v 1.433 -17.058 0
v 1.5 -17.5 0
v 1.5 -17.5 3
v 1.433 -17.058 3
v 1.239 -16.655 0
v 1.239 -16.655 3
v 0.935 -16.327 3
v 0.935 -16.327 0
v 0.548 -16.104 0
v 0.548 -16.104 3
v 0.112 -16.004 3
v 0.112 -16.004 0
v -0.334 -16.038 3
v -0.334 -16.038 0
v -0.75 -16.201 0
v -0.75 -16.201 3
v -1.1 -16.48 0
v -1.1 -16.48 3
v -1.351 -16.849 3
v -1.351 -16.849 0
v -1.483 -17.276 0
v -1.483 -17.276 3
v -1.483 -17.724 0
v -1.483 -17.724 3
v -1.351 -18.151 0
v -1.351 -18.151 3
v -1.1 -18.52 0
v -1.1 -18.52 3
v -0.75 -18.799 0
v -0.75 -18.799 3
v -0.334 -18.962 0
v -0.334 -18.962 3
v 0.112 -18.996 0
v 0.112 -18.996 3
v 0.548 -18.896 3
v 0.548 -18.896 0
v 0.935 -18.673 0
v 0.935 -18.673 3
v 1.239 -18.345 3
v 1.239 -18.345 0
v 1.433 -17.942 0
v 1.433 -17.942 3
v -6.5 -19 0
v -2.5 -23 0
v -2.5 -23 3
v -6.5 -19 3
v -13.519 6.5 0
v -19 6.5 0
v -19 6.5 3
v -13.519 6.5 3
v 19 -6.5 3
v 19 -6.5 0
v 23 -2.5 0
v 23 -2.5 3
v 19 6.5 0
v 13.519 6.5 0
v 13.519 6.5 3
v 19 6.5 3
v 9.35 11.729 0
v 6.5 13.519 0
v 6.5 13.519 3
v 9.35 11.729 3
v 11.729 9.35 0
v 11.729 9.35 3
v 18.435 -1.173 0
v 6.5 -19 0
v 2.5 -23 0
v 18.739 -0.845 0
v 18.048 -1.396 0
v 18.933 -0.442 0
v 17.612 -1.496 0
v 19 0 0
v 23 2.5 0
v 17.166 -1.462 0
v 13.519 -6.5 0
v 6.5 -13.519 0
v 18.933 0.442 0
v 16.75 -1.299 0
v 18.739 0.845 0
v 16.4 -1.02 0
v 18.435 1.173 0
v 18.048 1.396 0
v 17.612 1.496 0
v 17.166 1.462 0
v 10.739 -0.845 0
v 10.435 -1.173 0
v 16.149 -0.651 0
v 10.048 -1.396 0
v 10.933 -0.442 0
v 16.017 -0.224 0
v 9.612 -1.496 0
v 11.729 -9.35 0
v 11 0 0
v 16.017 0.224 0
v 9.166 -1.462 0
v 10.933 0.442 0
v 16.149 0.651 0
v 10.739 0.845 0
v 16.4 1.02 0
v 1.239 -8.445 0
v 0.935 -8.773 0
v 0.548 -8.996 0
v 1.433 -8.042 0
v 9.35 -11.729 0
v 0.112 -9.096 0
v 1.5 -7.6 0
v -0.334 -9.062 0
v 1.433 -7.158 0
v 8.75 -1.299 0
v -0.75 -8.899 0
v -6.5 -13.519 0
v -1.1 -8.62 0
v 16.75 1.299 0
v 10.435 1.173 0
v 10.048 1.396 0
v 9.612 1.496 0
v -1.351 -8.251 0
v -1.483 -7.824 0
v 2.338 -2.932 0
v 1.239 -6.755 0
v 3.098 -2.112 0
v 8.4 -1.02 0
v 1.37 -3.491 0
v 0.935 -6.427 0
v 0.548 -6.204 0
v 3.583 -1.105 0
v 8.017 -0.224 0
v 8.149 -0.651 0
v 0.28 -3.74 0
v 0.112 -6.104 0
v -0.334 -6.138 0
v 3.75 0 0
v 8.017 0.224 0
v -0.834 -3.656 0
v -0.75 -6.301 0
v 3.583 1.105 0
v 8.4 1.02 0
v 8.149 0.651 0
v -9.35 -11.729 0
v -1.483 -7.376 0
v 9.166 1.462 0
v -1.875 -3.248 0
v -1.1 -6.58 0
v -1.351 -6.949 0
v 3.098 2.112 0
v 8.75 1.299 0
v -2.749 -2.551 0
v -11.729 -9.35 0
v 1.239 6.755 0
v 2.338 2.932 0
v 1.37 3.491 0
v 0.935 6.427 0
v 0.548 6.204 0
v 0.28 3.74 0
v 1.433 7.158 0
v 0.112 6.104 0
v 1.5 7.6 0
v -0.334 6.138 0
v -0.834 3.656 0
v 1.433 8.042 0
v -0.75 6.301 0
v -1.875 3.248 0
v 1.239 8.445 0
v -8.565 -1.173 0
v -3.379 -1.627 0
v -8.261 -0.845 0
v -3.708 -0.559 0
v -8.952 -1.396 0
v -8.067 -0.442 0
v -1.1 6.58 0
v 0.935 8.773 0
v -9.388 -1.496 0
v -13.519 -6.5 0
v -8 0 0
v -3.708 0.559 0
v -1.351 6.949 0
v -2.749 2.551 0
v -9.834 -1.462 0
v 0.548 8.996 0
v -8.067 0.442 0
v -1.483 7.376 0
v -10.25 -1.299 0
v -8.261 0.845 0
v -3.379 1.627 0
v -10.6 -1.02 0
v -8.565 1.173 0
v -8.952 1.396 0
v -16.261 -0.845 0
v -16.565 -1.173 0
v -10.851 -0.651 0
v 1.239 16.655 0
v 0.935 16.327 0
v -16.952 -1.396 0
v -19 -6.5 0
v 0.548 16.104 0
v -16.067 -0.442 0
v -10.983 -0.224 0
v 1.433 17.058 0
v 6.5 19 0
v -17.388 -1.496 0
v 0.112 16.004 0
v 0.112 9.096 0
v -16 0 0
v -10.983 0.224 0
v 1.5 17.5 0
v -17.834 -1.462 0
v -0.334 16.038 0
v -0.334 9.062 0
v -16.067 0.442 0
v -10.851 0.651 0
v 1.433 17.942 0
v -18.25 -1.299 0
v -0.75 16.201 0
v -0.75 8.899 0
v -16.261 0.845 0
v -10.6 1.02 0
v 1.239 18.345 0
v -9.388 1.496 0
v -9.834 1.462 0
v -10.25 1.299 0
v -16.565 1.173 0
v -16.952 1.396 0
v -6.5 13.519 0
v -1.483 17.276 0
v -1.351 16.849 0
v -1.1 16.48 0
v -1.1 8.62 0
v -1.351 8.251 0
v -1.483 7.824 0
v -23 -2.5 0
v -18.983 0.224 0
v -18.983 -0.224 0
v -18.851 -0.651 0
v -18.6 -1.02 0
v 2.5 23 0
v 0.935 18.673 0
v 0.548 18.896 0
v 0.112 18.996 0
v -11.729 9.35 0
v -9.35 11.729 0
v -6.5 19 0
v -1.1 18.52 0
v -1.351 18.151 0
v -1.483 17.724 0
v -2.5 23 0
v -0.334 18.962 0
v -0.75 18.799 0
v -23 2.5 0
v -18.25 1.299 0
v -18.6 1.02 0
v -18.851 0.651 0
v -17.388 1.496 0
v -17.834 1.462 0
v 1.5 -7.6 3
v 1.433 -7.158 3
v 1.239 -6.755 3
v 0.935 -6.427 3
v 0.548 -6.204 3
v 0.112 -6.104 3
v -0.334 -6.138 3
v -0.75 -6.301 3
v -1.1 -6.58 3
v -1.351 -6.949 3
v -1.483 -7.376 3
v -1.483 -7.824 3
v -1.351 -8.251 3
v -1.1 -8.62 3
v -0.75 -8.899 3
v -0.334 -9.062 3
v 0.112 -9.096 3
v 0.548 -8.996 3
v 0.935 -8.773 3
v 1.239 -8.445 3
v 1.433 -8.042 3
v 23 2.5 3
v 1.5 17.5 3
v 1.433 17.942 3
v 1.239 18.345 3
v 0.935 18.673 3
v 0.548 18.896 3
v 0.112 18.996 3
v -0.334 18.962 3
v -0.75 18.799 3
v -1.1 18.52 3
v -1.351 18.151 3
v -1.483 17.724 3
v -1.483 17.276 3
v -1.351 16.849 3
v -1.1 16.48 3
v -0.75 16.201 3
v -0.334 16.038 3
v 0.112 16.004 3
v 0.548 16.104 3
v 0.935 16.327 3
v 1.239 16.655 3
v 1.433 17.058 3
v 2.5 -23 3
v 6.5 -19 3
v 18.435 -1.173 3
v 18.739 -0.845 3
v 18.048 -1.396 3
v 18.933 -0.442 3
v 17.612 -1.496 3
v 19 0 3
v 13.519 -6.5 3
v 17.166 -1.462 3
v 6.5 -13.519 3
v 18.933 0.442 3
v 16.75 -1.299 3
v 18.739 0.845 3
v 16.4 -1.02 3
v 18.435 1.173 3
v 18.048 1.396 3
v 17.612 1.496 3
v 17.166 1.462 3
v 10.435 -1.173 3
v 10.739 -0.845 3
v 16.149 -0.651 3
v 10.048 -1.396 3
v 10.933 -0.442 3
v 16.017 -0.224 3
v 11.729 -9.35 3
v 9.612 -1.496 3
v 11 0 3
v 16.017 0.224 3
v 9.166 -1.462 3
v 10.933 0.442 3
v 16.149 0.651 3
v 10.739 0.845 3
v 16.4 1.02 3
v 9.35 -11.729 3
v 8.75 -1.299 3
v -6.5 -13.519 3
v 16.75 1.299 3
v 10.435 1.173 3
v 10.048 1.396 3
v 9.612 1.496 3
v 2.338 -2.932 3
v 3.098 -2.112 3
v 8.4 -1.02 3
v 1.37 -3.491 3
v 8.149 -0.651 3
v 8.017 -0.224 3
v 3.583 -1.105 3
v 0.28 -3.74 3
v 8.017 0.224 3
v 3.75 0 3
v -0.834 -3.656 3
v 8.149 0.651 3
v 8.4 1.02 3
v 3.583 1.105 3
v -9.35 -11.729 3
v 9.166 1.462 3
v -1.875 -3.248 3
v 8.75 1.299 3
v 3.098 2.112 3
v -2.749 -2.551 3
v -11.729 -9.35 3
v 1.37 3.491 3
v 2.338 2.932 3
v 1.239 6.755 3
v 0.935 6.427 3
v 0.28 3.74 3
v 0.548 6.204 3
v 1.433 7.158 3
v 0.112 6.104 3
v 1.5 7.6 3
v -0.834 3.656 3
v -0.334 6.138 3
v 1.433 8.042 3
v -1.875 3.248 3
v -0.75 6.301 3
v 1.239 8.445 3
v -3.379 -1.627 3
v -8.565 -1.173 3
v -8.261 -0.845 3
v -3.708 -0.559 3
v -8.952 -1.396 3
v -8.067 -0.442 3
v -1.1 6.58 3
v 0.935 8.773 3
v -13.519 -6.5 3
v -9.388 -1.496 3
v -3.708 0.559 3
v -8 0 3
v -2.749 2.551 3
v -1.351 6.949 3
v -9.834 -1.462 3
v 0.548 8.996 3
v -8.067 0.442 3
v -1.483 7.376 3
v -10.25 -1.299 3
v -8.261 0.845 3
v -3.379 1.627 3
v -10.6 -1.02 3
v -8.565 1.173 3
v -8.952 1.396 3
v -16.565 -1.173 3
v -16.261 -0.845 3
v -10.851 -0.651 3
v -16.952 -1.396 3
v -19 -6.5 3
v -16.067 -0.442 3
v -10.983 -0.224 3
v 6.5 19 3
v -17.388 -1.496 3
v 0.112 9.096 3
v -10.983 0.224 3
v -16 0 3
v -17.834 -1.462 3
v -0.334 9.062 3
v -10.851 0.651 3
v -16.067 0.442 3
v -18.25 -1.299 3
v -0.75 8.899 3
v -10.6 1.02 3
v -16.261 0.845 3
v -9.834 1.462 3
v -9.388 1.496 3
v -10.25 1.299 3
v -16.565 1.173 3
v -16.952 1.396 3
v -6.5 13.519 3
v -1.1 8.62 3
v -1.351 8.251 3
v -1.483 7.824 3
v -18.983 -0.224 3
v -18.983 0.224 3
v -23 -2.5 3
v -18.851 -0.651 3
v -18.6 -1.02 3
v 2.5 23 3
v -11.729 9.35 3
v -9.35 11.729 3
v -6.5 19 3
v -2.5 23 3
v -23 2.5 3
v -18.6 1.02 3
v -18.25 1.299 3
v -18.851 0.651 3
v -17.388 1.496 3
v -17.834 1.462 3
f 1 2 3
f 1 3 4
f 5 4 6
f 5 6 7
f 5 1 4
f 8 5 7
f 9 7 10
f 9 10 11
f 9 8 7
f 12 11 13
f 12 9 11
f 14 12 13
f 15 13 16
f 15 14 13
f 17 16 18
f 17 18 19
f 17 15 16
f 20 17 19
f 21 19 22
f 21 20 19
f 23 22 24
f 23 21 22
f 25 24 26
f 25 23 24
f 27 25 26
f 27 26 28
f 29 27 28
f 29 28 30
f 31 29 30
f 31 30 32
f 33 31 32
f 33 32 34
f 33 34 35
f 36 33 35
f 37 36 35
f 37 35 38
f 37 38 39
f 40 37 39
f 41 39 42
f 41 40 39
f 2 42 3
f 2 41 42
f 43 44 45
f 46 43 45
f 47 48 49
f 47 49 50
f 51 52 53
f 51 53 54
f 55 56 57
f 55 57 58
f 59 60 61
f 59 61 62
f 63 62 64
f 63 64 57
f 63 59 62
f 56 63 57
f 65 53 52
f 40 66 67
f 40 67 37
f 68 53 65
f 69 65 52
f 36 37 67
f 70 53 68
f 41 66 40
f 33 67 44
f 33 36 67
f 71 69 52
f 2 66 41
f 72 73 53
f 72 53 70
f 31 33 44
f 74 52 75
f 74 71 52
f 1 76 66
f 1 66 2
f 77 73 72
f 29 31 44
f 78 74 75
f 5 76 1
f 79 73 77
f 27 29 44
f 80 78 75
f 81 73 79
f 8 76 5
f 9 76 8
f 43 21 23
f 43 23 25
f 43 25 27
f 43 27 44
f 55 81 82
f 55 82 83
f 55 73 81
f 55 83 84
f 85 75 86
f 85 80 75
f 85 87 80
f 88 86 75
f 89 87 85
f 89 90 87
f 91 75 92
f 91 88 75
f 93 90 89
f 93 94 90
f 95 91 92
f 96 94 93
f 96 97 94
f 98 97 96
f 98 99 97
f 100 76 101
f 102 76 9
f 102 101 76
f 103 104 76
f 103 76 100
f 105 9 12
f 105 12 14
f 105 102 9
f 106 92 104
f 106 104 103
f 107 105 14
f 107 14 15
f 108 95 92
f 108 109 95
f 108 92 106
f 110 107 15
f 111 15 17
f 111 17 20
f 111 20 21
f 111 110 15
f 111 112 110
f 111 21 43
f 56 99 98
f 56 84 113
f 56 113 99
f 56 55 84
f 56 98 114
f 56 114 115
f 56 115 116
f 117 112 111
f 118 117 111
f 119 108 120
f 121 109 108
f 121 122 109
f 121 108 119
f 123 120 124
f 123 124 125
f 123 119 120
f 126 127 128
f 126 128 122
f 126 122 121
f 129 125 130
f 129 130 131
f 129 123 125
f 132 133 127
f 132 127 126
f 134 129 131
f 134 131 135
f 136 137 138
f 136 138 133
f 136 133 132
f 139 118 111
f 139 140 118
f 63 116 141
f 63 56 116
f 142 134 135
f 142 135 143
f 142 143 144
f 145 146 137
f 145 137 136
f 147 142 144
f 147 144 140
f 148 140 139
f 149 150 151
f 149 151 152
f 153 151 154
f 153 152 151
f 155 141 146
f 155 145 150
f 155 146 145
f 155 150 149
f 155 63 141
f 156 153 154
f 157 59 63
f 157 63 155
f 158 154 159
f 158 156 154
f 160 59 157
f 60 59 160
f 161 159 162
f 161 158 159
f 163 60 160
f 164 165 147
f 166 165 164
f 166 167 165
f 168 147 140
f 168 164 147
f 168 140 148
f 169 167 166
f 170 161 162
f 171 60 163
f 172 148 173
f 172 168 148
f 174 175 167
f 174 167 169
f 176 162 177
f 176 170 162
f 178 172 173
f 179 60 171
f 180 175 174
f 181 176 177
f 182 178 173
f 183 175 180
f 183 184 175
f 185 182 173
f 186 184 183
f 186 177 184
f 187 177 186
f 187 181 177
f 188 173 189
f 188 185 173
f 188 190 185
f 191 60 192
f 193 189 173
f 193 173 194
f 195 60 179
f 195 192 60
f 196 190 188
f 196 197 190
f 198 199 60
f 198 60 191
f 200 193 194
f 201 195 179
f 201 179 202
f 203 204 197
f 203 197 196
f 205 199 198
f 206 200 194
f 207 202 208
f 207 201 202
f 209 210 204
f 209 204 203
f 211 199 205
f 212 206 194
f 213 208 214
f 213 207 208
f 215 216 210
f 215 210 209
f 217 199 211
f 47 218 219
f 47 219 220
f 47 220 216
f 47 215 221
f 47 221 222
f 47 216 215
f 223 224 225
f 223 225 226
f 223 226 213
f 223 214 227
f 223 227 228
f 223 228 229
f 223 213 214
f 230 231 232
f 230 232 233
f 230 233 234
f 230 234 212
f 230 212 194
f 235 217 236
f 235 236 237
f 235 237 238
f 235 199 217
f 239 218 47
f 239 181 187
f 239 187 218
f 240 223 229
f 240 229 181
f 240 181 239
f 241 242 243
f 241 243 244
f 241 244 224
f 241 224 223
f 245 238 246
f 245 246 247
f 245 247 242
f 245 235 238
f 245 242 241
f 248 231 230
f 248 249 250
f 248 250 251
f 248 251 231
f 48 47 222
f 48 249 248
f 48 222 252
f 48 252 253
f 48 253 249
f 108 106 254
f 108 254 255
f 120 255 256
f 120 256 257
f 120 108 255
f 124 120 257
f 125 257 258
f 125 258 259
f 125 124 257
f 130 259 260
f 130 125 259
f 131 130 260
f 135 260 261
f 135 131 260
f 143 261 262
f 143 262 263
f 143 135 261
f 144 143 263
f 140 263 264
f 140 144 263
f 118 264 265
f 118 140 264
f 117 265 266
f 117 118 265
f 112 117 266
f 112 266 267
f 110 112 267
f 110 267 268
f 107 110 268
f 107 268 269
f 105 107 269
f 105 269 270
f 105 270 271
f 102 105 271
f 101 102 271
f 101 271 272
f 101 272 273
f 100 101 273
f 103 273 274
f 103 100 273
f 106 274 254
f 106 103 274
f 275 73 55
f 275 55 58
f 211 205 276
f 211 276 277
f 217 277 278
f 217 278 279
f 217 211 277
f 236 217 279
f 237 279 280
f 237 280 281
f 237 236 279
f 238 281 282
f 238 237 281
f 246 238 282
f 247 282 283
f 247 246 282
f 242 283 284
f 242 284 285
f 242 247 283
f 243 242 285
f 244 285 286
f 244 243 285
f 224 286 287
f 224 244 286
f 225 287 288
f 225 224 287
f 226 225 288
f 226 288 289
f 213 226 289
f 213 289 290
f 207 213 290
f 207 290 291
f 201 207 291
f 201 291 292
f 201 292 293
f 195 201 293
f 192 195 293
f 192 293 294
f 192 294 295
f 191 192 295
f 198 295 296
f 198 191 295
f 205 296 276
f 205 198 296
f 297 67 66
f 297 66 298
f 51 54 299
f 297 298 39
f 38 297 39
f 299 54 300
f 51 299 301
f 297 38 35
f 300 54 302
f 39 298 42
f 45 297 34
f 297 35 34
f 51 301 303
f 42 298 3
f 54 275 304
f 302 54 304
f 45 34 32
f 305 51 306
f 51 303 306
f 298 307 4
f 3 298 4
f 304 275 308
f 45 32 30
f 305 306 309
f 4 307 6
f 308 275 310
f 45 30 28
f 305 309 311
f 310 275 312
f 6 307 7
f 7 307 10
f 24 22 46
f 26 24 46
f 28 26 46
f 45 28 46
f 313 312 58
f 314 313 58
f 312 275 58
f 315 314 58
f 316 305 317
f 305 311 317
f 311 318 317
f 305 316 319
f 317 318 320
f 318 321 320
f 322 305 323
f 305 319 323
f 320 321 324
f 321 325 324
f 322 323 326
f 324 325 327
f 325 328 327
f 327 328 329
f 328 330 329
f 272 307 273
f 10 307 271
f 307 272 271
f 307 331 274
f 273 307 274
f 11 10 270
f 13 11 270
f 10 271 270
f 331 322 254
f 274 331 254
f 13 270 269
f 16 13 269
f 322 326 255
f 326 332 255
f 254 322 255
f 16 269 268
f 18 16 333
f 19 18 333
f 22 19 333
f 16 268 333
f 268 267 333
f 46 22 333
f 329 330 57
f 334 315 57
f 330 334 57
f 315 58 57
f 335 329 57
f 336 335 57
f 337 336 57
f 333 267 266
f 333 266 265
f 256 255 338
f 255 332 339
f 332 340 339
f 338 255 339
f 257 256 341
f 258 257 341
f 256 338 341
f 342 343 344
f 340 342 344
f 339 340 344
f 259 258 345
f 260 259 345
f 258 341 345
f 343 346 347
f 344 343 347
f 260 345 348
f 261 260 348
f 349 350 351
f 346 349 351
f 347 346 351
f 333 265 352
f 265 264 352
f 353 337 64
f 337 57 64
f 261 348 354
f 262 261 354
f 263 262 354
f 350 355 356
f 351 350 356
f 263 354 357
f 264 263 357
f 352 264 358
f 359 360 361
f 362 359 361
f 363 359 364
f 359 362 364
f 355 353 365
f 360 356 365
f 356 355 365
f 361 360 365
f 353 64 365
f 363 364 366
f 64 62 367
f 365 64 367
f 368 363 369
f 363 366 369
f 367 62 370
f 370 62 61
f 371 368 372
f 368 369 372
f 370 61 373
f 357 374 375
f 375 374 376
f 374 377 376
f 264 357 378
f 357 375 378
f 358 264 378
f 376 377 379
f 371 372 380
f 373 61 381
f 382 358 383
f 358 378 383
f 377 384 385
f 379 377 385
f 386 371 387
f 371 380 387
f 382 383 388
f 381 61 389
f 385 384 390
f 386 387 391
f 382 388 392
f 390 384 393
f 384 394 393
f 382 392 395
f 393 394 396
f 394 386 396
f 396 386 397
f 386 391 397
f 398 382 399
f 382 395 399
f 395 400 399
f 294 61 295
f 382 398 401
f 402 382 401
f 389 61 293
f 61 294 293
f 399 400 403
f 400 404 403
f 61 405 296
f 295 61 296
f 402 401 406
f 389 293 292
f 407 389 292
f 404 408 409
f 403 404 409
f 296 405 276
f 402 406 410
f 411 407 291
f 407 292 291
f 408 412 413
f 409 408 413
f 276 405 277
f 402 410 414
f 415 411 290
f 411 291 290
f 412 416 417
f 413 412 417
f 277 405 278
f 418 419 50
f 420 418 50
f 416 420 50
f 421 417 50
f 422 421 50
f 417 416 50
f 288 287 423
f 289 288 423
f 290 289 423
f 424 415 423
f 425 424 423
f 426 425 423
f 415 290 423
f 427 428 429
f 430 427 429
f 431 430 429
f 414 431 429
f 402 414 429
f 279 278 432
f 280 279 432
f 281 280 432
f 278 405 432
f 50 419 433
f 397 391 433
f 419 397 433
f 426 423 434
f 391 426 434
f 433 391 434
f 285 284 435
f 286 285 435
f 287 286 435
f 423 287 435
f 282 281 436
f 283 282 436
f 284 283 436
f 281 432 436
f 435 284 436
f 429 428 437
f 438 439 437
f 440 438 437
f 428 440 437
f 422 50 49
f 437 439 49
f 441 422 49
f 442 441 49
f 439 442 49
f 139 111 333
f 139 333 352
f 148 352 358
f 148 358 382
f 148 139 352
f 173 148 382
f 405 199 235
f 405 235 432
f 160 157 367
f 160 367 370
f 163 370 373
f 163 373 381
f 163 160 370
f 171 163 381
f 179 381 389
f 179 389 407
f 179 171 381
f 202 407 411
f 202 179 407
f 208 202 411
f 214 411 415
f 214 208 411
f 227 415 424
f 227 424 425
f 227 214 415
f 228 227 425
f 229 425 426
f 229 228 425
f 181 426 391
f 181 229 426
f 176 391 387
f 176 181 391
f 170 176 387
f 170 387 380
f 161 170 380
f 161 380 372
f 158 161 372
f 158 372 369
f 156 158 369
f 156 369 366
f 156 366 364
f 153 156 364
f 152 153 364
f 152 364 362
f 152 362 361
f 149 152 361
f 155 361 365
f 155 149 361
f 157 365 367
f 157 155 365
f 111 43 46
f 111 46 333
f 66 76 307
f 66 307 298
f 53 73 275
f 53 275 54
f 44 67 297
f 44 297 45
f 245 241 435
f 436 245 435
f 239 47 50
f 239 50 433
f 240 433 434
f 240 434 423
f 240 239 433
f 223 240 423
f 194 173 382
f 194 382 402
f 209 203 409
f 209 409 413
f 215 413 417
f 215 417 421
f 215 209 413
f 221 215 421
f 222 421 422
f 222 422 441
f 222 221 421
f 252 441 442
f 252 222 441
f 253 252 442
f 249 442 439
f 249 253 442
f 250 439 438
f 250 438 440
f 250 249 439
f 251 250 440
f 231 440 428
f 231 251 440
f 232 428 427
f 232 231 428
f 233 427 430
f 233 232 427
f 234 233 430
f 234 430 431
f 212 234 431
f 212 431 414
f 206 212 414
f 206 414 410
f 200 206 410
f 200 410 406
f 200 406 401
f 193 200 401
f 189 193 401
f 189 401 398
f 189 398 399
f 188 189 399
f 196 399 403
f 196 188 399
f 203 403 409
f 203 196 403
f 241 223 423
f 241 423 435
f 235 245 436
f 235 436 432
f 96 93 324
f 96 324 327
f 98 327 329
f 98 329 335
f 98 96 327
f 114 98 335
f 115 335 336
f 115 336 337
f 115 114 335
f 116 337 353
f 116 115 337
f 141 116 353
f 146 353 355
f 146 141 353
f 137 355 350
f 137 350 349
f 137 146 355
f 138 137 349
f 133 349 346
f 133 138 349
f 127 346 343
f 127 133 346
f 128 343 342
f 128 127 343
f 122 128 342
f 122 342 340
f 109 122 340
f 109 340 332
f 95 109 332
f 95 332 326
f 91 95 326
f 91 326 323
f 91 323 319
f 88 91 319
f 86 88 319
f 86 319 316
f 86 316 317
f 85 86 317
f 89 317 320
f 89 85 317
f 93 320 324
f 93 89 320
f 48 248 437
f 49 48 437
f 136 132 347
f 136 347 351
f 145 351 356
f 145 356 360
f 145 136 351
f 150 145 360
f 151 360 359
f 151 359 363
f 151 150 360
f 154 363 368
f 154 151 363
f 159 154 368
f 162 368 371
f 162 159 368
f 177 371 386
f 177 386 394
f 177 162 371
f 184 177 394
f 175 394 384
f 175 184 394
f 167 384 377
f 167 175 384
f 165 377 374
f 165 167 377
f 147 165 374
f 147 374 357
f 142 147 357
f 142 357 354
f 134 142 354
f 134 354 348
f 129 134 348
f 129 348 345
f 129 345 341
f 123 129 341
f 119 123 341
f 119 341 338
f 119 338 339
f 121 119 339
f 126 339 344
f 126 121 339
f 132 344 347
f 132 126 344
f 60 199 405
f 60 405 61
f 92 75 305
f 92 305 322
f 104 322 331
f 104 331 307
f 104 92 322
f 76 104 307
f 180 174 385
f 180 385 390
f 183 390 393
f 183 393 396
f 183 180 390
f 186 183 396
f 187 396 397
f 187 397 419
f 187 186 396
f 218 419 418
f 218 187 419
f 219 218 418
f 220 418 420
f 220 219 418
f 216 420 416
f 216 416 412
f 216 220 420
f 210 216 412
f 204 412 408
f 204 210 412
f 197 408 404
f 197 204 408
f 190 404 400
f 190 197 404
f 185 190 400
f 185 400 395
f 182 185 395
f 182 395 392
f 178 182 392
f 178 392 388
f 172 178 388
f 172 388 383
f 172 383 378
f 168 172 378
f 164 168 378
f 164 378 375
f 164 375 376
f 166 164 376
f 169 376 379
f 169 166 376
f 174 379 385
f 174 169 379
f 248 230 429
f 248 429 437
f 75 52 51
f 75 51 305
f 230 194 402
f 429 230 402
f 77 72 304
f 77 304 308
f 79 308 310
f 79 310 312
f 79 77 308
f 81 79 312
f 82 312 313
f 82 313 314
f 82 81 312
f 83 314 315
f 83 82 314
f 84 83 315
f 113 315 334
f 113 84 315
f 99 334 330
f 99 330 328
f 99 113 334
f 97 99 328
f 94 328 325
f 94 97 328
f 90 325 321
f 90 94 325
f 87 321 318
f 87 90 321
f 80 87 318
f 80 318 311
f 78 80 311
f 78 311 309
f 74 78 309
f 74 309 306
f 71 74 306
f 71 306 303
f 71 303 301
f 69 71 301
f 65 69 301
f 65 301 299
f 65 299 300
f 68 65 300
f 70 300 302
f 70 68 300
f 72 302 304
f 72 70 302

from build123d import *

# Parameters (mm, degrees)
SKETCH1_R           = 1.5
SKETCH1_R_2         = 3.75
BOSS_EXTRUDE1_DEPTH = 3
CHAMFER1_SIZE       = 4


with BuildPart() as part:
    # Sketch1 → Boss-Extrude1 (new body)
    with BuildSketch(Plane.XY):
        with BuildLine():
            Line((-6.5, 23), (6.5, 23))
            Line((6.5, 23), (6.5, 13.518505835))
            ThreePointArc((6.5, 13.518505835), (10.606601718, 10.606601718), (13.518505835, 6.5))
            Line((13.518505835, 6.5), (23, 6.5))
            Line((23, 6.5), (23, -6.5))
            Line((23, -6.5), (13.518505835, -6.5))
            ThreePointArc((13.518505835, -6.5), (10.606601718, -10.606601718), (6.5, -13.518505835))
            Line((6.5, -13.518505835), (6.5, -23))
            Line((6.5, -23), (-6.5, -23))
            Line((-6.5, -23), (-6.5, -13.518505835))
            ThreePointArc((-6.5, -13.518505835), (-10.606601718, -10.606601718), (-13.518505835, -6.5))
            Line((-13.518505835, -6.5), (-23, -6.5))
            Line((-23, -6.5), (-23, 6.5))
            Line((-23, 6.5), (-13.518505835, 6.5))
            ThreePointArc((-13.518505835, 6.5), (-10.606601718, 10.606601718), (-6.5, 13.518505835))
            Line((-6.5, 13.518505835), (-6.5, 23))
        make_face()
        with Locations((0, 7.6)):
            Circle(SKETCH1_R, mode=Mode.SUBTRACT)
        with Locations((9.5, 0)):
            Circle(SKETCH1_R, mode=Mode.SUBTRACT)
        with Locations((-9.5, 0)):
            Circle(SKETCH1_R, mode=Mode.SUBTRACT)
        with Locations((0, -7.6)):
            Circle(SKETCH1_R, mode=Mode.SUBTRACT)
        with Locations((0, 17.5)):
            Circle(SKETCH1_R, mode=Mode.SUBTRACT)
        with Locations((17.5, 0)):
            Circle(SKETCH1_R, mode=Mode.SUBTRACT)
        with Locations((0, -17.5)):
            Circle(SKETCH1_R, mode=Mode.SUBTRACT)
        with Locations((-17.5, 0)):
            Circle(SKETCH1_R, mode=Mode.SUBTRACT)
        Circle(SKETCH1_R_2, mode=Mode.SUBTRACT)
    extrude(amount=BOSS_EXTRUDE1_DEPTH)

    # Chamfer1
    chamfer1_edges = [part.edges().sort_by_distance(p)[0] for p in [
        (23, 6.5, 1.5),
        (23, -6.5, 1.5),
        (6.5, -23, 1.5),
        (-6.5, -23, 1.5),
        (-23, -6.5, 1.5),
        (-23, 6.5, 1.5),
        (-6.5, 23, 1.5),
        (6.5, 23, 1.5),
    ]]
    chamfer(chamfer1_edges, length=CHAMFER1_SIZE)


solid = part.part
